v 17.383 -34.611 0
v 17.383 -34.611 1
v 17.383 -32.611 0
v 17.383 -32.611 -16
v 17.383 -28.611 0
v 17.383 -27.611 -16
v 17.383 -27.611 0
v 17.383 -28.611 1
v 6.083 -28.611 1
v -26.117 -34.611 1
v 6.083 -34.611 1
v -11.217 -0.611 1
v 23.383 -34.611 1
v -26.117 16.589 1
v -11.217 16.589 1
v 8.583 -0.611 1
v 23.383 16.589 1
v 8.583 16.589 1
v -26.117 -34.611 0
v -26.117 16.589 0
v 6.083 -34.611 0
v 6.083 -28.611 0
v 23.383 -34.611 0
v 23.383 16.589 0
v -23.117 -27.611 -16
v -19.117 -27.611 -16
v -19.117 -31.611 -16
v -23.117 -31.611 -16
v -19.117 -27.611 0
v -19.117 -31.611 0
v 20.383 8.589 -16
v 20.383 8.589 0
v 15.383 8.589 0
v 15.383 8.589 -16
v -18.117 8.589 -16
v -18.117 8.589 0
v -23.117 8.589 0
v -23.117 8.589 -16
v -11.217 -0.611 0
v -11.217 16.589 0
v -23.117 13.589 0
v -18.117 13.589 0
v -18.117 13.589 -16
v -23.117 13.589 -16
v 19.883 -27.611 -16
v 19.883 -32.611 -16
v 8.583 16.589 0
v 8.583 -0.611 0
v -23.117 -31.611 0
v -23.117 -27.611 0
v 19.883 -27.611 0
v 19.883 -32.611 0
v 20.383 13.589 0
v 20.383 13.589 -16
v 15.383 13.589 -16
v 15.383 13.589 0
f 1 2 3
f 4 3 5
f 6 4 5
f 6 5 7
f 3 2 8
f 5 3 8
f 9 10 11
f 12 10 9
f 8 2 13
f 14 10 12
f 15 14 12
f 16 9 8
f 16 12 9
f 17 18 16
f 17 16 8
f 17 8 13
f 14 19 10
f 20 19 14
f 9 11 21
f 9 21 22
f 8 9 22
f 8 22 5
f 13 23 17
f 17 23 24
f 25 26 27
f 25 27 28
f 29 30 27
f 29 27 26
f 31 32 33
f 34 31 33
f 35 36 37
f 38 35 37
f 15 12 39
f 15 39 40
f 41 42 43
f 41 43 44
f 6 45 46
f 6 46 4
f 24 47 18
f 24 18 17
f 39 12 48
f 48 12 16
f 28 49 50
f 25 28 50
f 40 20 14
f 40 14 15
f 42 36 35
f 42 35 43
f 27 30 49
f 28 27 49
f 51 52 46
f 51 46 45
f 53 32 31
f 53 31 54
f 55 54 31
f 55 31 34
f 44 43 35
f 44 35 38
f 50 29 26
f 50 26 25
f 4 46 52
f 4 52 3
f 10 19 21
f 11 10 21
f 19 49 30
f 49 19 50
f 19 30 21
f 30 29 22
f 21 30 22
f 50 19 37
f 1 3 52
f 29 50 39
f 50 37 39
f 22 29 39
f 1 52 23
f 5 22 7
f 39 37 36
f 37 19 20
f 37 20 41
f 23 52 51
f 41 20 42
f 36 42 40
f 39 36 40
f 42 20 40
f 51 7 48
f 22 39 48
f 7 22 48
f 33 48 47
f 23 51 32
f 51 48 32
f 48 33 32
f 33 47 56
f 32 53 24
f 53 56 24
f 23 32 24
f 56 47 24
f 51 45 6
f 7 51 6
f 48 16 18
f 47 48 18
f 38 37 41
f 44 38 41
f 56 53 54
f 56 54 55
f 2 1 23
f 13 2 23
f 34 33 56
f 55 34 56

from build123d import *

# Parameters (mm, degrees)
ESQUISSE1_W             = 49.5
ESQUISSE1_H             = 51.2
BOSS_EXTRU_1_DEPTH      = 1
ESQUISSE2_W             = 11.3
ESQUISSE2_H             = 6
ESQUISSE2_W_2           = 19.8
ESQUISSE2_H_2           = 17.2
ENL_V_MAT_EXTRU_1_DEPTH = 5
ESQUISSE4_W             = 5
ESQUISSE4_H             = 5
BOSS_EXTRU_3_DEPTH      = 16
ESQUISSE5_W             = 2.5
ESQUISSE5_H             = 5
BOSS_EXTRU_4_DEPTH      = 16
ESQUISSE6_W             = 5
ESQUISSE6_H             = 5
BOSS_EXTRU_5_DEPTH      = 16
ESQUISSE7_W             = 4
ESQUISSE7_H             = 4
BOSS_EXTRU_6_DEPTH      = 16


with BuildPart() as part:
    # Esquisse1 → Boss.-Extru.1 (new body)
    with BuildSketch(Plane.XY):
        with Locations((-1.366863252, -9.011290323)):
            Rectangle(ESQUISSE1_W, ESQUISSE1_H)
    extrude(amount=BOSS_EXTRU_1_DEPTH)

    # Esquisse2 → Enlèv. mat.-Extru.1 (cut)
    with BuildSketch(Plane.XY.offset(1)):
        with Locations((11.733136748, -31.611290323)):
            Rectangle(ESQUISSE2_W, ESQUISSE2_H)
        with Locations((-1.316863252, 7.988709677)):
            Rectangle(ESQUISSE2_W_2, ESQUISSE2_H_2)
    extrude(amount=-ENL_V_MAT_EXTRU_1_DEPTH, mode=Mode.SUBTRACT)

    # Esquisse4 → Boss.-Extru.3 (add)
    with BuildSketch(Plane(origin=(0, 0, 0), x_dir=(-1, 0, 0), z_dir=(0, 0, -1))):
        with Locations((20.616863252, 11.088709677)):
            Rectangle(ESQUISSE4_W, ESQUISSE4_H)
    extrude(amount=BOSS_EXTRU_3_DEPTH)

    # Esquisse5 → Boss.-Extru.4 (add)
    with BuildSketch(Plane(origin=(0, 0, 0), x_dir=(-1, 0, 0), z_dir=(0, 0, -1))):
        with Locations((-18.633136748, -30.111290323)):
            Rectangle(ESQUISSE5_W, ESQUISSE5_H)
    extrude(amount=BOSS_EXTRU_4_DEPTH)

    # Esquisse6 → Boss.-Extru.5 (add)
    with BuildSketch(Plane(origin=(0, 0, 0), x_dir=(-1, 0, 0), z_dir=(0, 0, -1))):
        with Locations((-17.883136748, 11.088709677)):
            Rectangle(ESQUISSE6_W, ESQUISSE6_H)
    extrude(amount=BOSS_EXTRU_5_DEPTH)

    # Esquisse7 → Boss.-Extru.6 (add)
    with BuildSketch(Plane(origin=(0, 0, 0), x_dir=(-1, 0, 0), z_dir=(0, 0, -1))):
        with Locations((21.116863252, -29.611290323)):
            Rectangle(ESQUISSE7_W, ESQUISSE7_H)
    extrude(amount=BOSS_EXTRU_6_DEPTH)


solid = part.part
